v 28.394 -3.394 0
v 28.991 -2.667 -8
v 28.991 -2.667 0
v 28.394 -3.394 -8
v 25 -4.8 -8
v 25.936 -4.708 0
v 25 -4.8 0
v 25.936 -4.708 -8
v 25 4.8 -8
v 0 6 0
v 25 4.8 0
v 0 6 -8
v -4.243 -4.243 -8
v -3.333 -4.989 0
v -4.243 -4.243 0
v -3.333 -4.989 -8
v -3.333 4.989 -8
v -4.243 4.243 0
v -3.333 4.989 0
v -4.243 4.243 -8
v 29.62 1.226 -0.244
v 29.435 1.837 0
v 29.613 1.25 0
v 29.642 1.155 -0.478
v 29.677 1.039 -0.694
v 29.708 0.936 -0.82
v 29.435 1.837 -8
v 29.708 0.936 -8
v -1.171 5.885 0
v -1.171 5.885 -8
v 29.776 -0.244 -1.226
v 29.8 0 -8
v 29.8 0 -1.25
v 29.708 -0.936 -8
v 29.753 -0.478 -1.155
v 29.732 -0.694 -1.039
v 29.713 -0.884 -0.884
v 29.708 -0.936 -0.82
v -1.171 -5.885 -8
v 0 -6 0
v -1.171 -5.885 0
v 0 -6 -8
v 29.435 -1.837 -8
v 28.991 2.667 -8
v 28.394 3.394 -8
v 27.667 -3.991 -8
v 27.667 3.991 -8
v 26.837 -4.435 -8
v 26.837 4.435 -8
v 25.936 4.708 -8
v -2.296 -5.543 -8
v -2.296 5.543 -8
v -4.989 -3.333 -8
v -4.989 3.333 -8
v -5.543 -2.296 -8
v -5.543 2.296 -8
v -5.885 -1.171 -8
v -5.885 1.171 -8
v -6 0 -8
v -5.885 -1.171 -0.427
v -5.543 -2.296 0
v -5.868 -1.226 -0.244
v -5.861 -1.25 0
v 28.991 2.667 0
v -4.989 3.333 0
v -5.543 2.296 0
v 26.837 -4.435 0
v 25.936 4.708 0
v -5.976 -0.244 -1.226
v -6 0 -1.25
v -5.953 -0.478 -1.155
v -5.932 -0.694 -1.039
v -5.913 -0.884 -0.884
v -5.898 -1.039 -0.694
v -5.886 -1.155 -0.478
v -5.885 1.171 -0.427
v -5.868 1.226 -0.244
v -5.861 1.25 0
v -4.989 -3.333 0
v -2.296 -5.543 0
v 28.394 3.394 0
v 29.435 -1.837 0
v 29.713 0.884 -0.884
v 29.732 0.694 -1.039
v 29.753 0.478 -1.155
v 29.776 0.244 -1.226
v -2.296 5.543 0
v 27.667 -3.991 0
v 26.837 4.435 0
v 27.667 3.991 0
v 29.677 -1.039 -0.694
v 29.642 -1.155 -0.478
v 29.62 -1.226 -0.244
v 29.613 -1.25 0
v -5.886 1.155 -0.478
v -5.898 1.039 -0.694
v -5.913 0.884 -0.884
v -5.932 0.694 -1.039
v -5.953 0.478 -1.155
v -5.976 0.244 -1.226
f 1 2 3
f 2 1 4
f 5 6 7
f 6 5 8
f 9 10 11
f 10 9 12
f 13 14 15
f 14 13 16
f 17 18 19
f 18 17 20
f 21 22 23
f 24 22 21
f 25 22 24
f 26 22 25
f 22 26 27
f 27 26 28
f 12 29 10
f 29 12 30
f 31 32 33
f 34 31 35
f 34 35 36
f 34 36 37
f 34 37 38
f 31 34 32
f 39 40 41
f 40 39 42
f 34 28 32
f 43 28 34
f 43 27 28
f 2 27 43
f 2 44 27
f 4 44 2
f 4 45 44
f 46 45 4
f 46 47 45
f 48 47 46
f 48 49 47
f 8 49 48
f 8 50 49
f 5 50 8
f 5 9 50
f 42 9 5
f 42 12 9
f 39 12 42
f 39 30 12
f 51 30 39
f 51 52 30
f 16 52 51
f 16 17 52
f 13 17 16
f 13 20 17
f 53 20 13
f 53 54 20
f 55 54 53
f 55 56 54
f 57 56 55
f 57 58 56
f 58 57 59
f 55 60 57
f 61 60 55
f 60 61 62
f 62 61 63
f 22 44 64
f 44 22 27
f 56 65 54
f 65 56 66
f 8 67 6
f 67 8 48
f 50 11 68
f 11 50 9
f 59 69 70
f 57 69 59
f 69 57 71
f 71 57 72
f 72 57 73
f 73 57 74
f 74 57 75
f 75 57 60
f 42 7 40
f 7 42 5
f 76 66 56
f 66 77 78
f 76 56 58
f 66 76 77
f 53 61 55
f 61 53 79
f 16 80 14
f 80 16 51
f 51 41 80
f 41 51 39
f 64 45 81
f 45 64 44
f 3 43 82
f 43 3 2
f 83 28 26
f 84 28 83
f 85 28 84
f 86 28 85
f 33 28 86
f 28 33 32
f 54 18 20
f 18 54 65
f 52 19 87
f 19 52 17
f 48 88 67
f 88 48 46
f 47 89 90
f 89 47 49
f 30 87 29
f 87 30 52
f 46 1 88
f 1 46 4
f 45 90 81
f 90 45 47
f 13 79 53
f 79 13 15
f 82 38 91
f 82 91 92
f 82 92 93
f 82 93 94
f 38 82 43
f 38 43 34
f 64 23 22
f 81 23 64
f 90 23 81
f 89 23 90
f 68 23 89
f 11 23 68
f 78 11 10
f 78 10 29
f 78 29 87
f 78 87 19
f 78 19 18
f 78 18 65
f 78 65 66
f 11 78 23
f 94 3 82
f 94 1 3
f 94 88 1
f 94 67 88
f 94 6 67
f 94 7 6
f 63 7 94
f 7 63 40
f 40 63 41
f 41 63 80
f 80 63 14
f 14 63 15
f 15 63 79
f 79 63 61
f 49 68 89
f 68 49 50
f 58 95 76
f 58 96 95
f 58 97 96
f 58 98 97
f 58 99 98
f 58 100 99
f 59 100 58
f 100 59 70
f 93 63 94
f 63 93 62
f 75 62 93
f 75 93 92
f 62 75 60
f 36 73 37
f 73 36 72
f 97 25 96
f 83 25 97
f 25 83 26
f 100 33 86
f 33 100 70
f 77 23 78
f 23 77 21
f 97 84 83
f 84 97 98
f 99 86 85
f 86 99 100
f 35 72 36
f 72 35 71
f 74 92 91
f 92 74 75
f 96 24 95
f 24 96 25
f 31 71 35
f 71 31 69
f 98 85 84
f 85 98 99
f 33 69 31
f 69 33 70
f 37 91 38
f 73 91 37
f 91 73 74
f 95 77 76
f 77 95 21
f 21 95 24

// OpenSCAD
// COBRA Finger Segment - PROXIMAL
// Length: 25.0mm, Width: 12mm

$fn = 32;

module finger_segment() {
    difference() {
        hull() {
            translate([0, 0, -4])
            cylinder(h=8, d=12, center=true);
            
            translate([25.0, 0, -4])
            cylinder(h=8, d=9.600000000000001, center=true);
        }
        
        // Tendon channel
        translate([12.5, 0, 0])
        rotate([0, 90, 0])
        cylinder(h=27.0, d=2.5, center=true);
        
        // Pivot holes
        translate([0, 0, 0])
        rotate([0, 90, 0])
        cylinder(h=14, d=2.5, center=true);
        
        translate([25.0, 0, 0])
        rotate([0, 90, 0])
        cylinder(h=14, d=2.5, center=true);
    }
}

finger_segment();
